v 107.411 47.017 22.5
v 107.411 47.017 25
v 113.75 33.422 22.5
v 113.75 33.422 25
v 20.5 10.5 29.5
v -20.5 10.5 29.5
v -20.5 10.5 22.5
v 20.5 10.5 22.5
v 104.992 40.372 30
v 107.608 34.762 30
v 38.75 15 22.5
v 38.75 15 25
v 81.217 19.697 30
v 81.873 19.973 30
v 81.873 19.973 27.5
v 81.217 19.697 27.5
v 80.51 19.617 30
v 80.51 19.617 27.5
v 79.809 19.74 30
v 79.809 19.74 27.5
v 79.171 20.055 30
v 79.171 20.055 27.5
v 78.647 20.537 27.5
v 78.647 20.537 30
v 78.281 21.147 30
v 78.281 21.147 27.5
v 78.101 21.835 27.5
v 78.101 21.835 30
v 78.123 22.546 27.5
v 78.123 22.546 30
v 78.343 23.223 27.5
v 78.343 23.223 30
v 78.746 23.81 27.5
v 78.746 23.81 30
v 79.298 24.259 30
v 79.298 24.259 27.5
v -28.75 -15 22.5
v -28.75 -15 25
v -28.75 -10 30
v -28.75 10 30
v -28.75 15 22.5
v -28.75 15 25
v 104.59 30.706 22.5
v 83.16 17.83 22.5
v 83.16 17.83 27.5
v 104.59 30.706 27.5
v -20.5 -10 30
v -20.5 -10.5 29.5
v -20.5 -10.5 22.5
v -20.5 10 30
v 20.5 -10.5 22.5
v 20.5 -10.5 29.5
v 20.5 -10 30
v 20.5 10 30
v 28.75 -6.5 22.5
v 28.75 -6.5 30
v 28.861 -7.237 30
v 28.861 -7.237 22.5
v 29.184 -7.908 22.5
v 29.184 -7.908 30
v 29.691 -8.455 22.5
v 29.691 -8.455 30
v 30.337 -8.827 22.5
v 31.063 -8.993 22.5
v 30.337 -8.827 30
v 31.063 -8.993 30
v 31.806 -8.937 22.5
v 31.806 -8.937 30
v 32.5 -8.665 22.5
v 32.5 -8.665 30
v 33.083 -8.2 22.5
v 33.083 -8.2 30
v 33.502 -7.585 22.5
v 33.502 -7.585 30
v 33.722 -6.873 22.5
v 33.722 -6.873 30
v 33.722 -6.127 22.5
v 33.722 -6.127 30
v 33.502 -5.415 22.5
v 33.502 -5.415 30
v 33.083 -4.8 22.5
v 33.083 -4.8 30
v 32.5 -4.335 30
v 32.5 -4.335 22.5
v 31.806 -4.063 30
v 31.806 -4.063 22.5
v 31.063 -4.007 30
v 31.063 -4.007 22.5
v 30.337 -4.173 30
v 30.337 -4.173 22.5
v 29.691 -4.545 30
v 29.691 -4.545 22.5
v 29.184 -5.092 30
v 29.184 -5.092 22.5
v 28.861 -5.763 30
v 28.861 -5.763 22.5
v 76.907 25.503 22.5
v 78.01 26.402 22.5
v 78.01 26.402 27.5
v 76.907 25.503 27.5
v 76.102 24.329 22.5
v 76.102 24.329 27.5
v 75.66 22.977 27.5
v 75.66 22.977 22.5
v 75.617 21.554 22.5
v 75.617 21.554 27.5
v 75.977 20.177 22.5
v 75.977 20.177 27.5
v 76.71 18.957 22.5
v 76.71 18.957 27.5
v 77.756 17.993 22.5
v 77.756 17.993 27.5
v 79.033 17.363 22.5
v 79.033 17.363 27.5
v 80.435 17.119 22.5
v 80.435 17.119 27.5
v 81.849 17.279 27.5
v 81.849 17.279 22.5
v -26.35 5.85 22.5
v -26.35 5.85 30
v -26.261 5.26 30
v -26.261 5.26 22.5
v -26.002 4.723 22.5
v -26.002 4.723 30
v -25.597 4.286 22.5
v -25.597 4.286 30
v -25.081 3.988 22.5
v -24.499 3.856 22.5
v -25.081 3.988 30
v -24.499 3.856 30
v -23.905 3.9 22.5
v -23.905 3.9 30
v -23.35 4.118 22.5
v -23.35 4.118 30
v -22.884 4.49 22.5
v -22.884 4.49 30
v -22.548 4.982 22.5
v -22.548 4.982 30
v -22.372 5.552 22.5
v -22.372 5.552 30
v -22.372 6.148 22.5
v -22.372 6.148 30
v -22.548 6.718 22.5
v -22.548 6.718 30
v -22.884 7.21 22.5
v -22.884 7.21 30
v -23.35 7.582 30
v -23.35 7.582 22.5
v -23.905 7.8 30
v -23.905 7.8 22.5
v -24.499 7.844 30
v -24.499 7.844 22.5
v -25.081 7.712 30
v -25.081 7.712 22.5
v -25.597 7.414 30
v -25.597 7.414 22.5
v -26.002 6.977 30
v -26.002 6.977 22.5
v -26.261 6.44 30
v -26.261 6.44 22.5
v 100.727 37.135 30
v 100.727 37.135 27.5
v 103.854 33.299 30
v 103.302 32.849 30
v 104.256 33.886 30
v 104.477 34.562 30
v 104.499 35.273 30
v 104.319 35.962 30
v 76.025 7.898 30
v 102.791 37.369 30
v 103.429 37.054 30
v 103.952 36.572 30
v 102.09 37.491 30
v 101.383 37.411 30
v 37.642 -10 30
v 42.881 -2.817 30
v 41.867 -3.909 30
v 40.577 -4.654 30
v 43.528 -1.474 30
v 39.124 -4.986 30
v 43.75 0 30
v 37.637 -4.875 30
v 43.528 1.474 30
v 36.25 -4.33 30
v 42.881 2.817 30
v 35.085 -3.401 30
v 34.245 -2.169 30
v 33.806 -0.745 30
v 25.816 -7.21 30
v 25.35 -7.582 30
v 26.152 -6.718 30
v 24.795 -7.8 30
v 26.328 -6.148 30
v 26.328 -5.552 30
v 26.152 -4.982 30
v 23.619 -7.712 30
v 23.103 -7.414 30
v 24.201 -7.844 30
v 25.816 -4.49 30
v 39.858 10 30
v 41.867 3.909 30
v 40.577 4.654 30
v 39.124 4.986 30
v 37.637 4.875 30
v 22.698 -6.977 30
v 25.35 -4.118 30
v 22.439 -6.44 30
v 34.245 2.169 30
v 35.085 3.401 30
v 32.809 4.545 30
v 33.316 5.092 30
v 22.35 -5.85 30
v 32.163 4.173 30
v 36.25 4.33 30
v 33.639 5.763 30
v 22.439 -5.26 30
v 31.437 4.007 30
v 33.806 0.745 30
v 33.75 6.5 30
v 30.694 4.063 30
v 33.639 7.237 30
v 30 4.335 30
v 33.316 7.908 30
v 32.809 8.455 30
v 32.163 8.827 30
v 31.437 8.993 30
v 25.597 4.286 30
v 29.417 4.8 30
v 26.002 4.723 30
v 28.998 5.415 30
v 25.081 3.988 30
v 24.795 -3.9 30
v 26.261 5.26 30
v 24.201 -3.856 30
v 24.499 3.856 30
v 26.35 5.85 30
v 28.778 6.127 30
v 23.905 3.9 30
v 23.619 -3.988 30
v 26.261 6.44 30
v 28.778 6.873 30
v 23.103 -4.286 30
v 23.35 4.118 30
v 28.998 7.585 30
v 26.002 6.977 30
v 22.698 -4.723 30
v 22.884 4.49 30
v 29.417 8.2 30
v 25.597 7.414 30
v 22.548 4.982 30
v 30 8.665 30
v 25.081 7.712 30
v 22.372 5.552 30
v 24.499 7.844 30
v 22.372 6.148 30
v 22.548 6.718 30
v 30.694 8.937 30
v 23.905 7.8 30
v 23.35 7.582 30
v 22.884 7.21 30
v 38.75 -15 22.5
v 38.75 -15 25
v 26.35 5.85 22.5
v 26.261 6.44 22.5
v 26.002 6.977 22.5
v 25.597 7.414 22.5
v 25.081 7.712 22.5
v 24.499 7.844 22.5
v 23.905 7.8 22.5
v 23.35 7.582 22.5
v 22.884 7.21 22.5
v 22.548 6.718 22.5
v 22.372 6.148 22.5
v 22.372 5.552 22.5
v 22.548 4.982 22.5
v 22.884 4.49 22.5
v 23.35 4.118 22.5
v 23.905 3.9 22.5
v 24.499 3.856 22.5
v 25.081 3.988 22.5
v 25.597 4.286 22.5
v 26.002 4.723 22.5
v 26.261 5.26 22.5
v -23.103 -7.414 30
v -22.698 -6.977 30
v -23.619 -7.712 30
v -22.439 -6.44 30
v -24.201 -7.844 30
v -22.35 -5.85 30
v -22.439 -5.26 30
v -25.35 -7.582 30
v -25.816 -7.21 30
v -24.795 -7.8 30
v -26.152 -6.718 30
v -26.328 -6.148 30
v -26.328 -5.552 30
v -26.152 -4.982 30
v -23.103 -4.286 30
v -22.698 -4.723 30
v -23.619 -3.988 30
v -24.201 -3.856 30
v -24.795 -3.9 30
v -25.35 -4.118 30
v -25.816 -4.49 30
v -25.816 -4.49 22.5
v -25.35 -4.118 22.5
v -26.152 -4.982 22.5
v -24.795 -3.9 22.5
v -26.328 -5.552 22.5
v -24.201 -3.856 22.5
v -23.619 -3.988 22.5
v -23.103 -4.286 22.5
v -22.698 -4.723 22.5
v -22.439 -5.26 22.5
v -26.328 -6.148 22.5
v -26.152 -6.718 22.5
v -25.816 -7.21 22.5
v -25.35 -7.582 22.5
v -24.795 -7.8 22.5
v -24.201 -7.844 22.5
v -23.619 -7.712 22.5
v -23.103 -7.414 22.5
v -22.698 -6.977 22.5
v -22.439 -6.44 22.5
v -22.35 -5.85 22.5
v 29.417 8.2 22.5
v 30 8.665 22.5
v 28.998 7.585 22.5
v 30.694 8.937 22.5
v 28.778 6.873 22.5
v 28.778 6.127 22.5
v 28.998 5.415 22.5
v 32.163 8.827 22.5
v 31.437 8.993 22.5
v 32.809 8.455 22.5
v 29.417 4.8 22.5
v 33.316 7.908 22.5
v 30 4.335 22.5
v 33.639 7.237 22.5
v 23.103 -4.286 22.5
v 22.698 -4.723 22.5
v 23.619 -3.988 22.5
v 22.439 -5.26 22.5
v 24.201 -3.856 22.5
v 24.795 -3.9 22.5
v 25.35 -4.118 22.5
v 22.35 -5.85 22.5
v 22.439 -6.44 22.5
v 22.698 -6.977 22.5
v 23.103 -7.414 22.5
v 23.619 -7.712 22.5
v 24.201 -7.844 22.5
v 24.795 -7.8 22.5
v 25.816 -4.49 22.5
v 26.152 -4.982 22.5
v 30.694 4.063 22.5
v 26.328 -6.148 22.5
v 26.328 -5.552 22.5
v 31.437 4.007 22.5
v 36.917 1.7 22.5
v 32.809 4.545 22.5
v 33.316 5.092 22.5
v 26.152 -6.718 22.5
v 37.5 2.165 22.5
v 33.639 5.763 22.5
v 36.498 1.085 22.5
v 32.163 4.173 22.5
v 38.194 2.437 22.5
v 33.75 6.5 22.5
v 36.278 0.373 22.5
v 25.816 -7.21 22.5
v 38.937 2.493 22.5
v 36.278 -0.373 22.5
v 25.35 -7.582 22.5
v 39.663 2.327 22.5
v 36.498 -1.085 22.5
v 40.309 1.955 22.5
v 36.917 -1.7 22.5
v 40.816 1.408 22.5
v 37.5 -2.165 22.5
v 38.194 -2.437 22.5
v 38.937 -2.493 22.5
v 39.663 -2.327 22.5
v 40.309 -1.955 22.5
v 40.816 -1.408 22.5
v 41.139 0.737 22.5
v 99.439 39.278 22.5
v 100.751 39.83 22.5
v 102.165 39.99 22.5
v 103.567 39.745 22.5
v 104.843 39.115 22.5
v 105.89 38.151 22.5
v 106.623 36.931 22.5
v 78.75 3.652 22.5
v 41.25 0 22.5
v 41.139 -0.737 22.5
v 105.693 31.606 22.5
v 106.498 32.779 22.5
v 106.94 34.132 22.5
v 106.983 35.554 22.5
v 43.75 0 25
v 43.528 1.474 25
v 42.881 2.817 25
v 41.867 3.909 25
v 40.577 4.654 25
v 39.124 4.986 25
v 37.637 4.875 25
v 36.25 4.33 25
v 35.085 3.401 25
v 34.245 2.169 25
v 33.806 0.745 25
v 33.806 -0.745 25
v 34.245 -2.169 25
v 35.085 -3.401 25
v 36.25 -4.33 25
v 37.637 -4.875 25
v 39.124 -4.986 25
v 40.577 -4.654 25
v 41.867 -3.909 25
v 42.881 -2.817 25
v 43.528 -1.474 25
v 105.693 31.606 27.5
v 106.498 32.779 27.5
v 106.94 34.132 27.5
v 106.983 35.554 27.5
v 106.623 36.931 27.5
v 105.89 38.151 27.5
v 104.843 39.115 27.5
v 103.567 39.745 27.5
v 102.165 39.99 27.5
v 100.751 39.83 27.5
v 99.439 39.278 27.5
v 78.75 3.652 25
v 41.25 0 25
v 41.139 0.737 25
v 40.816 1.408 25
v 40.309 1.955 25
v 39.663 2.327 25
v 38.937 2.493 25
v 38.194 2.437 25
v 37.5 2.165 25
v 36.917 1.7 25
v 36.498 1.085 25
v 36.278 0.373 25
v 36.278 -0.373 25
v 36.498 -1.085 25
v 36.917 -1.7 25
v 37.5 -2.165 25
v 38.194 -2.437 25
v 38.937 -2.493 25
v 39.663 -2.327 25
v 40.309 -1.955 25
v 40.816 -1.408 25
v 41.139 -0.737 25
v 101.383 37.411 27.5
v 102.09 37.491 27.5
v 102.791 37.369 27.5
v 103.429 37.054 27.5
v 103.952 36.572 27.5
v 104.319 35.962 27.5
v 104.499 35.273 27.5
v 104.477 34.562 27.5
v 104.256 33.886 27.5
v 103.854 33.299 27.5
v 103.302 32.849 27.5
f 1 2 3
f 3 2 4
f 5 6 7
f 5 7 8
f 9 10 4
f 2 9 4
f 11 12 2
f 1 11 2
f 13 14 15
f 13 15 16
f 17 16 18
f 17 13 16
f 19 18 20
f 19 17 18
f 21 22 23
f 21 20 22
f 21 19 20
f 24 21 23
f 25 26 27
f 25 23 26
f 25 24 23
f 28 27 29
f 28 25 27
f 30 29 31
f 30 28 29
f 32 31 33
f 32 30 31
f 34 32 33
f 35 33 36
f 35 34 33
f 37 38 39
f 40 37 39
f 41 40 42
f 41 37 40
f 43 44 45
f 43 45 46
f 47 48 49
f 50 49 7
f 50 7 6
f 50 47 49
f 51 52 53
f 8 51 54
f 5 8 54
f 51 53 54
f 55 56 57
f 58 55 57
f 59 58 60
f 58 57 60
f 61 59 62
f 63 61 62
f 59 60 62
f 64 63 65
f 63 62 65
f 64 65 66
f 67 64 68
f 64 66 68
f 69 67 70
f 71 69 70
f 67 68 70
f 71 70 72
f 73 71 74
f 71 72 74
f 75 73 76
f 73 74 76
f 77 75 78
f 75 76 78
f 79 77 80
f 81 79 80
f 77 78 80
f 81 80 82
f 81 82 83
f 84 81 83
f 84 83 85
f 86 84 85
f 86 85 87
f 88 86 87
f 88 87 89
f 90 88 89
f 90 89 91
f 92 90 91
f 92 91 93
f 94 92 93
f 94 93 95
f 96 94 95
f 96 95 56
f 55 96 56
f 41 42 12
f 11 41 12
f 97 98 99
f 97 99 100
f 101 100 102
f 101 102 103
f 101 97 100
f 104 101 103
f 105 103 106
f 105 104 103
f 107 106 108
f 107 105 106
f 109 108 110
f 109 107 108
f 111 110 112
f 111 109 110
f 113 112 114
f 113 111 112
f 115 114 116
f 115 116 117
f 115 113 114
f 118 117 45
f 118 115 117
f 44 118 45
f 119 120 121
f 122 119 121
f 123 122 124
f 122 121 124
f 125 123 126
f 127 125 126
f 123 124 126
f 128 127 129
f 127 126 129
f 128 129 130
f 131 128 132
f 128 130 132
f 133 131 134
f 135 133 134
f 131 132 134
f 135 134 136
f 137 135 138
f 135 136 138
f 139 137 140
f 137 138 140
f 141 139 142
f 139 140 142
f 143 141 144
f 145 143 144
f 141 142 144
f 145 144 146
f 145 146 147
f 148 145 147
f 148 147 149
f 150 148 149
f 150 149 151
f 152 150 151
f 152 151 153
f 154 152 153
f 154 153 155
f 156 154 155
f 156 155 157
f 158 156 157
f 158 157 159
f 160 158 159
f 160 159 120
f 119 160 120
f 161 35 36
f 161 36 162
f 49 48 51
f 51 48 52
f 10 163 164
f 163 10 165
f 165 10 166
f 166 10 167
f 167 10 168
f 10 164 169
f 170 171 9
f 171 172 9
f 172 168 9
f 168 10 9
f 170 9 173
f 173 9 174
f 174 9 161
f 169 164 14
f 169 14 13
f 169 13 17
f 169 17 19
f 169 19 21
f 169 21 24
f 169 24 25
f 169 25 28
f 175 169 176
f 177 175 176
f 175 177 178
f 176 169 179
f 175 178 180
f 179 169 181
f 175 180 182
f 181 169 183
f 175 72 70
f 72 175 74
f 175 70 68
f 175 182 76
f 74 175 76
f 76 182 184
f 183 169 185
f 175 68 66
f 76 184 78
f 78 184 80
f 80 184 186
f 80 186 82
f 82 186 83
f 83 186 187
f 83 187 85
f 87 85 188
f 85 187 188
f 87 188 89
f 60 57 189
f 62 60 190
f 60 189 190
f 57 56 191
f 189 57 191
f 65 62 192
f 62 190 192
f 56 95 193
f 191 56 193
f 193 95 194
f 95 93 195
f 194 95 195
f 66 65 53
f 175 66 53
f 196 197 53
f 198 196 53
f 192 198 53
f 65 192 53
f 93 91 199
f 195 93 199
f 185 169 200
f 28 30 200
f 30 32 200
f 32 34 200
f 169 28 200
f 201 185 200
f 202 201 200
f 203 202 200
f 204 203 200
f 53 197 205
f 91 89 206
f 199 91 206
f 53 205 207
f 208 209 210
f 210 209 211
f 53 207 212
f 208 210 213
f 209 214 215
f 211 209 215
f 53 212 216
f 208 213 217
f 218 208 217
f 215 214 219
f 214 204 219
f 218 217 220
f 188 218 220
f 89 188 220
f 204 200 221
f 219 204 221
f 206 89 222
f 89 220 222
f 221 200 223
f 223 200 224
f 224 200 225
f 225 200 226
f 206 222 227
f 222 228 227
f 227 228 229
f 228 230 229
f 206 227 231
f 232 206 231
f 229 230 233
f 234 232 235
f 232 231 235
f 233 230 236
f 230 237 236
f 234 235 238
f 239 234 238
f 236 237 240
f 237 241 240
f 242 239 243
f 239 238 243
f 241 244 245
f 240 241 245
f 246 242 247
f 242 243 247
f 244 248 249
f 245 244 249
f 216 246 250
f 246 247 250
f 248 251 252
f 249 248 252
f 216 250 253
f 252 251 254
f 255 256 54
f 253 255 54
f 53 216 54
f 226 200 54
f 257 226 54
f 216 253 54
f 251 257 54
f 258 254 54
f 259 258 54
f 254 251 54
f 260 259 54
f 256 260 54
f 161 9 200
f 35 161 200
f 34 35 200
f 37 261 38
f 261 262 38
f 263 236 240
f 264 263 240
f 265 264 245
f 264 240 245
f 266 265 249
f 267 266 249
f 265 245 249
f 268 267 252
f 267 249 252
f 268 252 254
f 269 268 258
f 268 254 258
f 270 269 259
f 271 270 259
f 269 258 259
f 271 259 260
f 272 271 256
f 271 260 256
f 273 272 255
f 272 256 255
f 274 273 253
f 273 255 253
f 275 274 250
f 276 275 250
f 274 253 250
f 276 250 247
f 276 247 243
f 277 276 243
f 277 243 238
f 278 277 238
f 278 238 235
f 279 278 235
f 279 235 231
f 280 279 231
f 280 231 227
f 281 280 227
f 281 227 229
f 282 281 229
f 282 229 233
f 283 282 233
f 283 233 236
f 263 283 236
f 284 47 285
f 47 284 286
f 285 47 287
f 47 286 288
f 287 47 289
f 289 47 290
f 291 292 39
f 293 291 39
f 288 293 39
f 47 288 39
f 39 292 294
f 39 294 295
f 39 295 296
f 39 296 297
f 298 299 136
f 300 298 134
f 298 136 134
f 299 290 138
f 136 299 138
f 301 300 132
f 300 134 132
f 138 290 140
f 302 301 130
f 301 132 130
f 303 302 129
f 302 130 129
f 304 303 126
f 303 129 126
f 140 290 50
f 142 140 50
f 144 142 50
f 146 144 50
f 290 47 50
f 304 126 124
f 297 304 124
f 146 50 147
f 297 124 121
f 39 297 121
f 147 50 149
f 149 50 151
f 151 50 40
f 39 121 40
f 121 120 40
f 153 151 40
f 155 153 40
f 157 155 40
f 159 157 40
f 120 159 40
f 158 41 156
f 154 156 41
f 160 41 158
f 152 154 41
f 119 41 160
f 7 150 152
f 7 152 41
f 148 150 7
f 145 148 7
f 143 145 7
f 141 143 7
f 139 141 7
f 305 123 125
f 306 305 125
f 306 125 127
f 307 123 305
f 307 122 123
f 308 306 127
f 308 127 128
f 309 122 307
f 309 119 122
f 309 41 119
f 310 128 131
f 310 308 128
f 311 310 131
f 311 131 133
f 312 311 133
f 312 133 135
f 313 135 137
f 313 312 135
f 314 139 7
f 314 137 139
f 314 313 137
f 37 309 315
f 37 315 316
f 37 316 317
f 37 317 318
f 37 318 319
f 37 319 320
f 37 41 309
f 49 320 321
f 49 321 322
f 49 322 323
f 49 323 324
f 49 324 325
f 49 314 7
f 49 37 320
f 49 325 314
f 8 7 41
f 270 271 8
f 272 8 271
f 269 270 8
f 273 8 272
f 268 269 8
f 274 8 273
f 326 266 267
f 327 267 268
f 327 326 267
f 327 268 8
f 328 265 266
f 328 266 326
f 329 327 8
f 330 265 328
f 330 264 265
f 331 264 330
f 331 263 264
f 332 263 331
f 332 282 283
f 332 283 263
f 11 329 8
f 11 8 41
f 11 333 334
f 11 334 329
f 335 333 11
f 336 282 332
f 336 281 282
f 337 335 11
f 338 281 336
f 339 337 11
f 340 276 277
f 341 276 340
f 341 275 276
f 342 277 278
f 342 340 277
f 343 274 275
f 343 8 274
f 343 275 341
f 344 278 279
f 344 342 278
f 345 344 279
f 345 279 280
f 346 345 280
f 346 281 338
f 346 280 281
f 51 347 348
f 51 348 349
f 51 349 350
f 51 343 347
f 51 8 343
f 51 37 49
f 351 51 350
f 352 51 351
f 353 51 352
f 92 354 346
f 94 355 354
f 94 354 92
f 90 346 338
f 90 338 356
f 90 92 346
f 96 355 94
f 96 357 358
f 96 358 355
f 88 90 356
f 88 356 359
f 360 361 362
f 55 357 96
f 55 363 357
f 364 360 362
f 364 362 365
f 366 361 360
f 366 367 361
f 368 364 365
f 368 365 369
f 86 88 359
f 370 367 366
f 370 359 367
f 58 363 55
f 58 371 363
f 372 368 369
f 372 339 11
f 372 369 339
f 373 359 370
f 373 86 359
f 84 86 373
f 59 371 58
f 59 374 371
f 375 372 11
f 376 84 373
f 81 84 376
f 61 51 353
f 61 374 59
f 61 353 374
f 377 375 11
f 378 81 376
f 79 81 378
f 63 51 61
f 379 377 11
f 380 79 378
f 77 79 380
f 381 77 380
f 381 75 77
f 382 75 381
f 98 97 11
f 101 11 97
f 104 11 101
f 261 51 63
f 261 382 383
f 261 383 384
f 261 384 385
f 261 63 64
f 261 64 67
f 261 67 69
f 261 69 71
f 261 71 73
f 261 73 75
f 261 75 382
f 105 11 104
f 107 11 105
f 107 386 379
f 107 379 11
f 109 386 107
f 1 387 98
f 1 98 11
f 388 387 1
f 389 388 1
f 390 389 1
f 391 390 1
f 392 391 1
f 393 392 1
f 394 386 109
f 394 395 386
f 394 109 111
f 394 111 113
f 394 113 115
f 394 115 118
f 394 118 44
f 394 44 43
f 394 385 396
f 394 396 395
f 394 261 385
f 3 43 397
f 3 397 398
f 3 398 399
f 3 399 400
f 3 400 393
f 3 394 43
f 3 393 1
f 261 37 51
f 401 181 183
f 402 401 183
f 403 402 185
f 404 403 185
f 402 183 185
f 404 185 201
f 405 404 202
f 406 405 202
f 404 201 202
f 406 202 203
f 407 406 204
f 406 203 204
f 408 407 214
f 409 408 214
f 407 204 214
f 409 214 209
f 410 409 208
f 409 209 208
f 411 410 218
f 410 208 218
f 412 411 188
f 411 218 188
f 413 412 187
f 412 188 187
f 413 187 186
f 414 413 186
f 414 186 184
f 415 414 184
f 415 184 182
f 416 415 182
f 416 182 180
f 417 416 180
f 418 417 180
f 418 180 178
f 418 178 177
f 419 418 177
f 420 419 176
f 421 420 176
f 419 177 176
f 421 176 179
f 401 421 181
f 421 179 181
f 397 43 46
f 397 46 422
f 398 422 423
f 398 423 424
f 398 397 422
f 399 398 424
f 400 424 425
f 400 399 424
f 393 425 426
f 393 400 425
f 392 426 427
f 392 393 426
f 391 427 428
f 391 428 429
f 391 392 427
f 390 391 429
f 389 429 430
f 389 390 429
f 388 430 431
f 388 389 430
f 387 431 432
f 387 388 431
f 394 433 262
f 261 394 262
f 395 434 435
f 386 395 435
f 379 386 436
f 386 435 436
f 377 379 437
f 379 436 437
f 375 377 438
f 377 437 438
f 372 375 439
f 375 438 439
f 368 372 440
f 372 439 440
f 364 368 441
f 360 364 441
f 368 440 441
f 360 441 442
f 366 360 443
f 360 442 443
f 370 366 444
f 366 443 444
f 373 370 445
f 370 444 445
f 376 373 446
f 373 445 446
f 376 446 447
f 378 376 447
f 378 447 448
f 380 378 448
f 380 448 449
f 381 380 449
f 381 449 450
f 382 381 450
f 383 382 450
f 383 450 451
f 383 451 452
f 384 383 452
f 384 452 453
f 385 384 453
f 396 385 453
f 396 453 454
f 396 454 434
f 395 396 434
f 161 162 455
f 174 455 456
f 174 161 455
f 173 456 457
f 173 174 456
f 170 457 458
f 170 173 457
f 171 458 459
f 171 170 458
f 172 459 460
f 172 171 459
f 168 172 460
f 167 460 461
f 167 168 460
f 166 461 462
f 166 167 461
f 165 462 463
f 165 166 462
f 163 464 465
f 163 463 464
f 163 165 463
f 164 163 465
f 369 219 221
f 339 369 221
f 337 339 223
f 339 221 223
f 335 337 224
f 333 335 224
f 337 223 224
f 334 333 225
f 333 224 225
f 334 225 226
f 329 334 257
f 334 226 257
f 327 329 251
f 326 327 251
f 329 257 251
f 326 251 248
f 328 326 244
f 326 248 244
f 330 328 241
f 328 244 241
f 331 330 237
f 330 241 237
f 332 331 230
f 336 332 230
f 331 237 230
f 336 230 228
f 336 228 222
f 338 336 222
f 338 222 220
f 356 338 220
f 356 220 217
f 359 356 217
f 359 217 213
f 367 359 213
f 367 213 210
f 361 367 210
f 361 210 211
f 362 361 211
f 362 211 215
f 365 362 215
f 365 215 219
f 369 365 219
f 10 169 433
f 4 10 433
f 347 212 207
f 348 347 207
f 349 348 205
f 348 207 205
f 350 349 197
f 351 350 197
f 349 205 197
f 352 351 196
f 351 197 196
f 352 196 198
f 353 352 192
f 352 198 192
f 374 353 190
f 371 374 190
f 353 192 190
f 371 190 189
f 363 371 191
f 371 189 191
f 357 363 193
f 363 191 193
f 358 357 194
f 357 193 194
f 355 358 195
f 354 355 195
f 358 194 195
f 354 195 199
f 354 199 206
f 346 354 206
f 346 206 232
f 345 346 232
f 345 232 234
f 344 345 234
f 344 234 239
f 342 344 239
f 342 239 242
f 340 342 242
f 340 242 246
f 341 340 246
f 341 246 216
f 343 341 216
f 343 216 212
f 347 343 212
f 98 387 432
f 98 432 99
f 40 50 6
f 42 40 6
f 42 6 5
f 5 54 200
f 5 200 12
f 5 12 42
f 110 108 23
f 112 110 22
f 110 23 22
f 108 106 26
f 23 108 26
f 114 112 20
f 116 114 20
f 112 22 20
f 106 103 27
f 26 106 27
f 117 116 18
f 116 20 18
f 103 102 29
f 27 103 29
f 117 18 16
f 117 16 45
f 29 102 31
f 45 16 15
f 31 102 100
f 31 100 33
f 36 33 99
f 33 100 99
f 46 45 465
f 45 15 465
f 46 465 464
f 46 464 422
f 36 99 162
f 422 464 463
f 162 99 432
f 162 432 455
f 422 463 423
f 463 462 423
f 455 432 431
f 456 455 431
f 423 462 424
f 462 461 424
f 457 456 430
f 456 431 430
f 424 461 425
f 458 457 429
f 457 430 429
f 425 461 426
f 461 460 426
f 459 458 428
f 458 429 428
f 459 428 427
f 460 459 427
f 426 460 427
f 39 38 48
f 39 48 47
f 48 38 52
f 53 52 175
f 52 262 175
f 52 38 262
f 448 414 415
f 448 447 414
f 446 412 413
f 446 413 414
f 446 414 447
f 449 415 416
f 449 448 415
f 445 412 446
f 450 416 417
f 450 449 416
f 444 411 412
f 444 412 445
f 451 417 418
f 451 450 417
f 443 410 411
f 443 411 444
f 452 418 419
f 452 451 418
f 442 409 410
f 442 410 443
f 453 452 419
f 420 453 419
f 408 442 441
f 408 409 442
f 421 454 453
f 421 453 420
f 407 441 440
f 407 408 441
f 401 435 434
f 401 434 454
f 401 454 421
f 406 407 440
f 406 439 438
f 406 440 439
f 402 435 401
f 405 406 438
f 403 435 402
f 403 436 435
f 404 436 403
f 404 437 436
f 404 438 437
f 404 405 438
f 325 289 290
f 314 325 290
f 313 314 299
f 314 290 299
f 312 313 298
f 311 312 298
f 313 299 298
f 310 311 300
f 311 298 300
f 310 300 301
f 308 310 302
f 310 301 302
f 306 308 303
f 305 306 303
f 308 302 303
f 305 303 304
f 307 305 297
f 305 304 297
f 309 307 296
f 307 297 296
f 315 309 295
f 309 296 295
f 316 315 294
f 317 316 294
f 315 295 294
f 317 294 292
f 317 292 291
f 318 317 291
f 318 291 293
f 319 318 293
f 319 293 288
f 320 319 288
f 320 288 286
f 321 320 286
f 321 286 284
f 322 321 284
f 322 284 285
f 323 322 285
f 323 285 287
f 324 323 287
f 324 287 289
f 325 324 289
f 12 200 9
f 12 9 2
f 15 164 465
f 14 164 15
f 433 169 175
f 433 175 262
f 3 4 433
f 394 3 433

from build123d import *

# Parameters (mm, degrees)
SKETCH1_W                = 57.5
SKETCH1_H                = 30
BOSS_EXTRUDE1_DEPTH      = 30
SKETCH2_W                = 41
SKETCH2_H                = 21
CUT_EXTRUDE1_DEPTH       = 25
SKETCH8_R                = 2
CUT_EXTRUDE6_DEPTH       = 10
SKETCH10_R               = 5
CUT_EXTRUDE8_DEPTH       = 10
BOSS_EXTRUDE4_DEPTH      = 30
SKETCH16_R               = 5
CUT_EXTRUDE10_DEPTH      = 30
CHAMFER5_SIZE            = 5
SKETCH19_R               = 2.5
CUT_EXTRUDE12_DEPTH      = 30
SKETCH20_R               = 7.5
CUT_EXTRUDE13_DEPTH      = 2.5
CUT_EXTRUDE15_DEPTH      = 122.918629513
CUT_EXTRUDE15_DEPTH_BACK = 122.918629513
SKETCH29_W               = 67.5
SKETCH29_H               = 17.5
CUT_EXTRUDE16_DEPTH      = 124.312257678
SKETCH32_R               = 5
CUT_EXTRUDE18_DEPTH      = 5
CUT_EXTRUDE19_DEPTH      = 5


with BuildPart() as part:
    # Sketch1 → Boss-Extrude1 (new body)
    with BuildSketch(Plane.XY):
        Rectangle(SKETCH1_W, SKETCH1_H)
    extrude(amount=BOSS_EXTRUDE1_DEPTH)

    # Sketch2 → Cut-Extrude1 (cut)
    with BuildSketch(Plane.XY.offset(30)):
        Rectangle(SKETCH2_W, SKETCH2_H)
    extrude(amount=-CUT_EXTRUDE1_DEPTH, mode=Mode.SUBTRACT)

    # Sketch8 → Cut-Extrude6 (cut)
    with BuildSketch(Plane.XY.offset(30)):
        with Locations((24.35, 5.85)):
            Circle(SKETCH8_R)
        with Locations(Location((24.35, -5.85, 0), (0, 0, 180))):
            Circle(SKETCH8_R)
        with Locations((-24.35, -5.85)):
            Circle(SKETCH8_R)
        with Locations(Location((-24.35, 5.85, 0), (0, 0, 180))):
            Circle(SKETCH8_R)
    extrude(amount=-CUT_EXTRUDE6_DEPTH, mode=Mode.SUBTRACT)

    # Sketch10 → Cut-Extrude8 (cut)
    with BuildSketch(Plane.XY.offset(5)):
        with Locations((-10, 0)):
            Circle(SKETCH10_R)
    extrude(amount=-CUT_EXTRUDE8_DEPTH, mode=Mode.SUBTRACT)

    # Sketch13 → Boss-Extrude4 (add)
    with BuildSketch(Plane.XY.offset(30)):
        Polygon((28.75, 15), (38.75, 15), (107.410726074, 47.017022383), (113.75, 33.422405577), (78.75, 3.652306326), (38.75, -15), (28.75, -15), align=None)
    extrude(amount=-BOSS_EXTRUDE4_DEPTH)

    # Sketch16 → Cut-Extrude10 (cut)
    with BuildSketch(Plane(origin=(1.175656739, -2.521204013, 0), x_dir=(0.9063077870366488, 0.42261826174070183, 0), z_dir=(-0.42261826174070183, 0.9063077870366488, 0))):
        with Locations(Location((97.217429724, -15, 0), (0, 0, 180))):
            Circle(SKETCH16_R)
        with BuildLine():
            Line((67.217429724, -12.5), (82.217429724, -12.5))
            ThreePointArc((82.217429724, -12.5), (84.717429724, -15), (82.217429724, -17.5))
            Line((82.217429724, -17.5), (67.217429724, -17.5))
            ThreePointArc((67.217429724, -17.5), (64.717429724, -15), (67.217429724, -12.5))
        make_face()
    extrude(amount=-CUT_EXTRUDE10_DEPTH, mode=Mode.SUBTRACT)

    # Chamfer5
    # the kernel refuses this chamfer: 5 mm, written as the material it takes off along each edge
    with BuildSketch(Plane(origin=(-28.75, 27.85841494, 0), x_dir=(-0.027495876610586317, 0, 0.9996219169112968), z_dir=(0, -1, 0))) as chamfer5_piece_1:
        Polygon((CHAMFER5_SIZE * 0.999621916911, -CHAMFER5_SIZE * 0.0274958766106), (-CHAMFER5_SIZE * 0.0274958766106, -CHAMFER5_SIZE * 0.999621916911), (0, 0), align=None)
    extrude(amount=55.71682988, mode=Mode.SUBTRACT)
    with BuildSketch(Plane(origin=(-41.60841494, -15, 0), x_dir=(0, -0.027495876610586317, 0.9996219169112968), z_dir=(1, 0, 0)), Plane(origin=(51.60841494, -15, 30), x_dir=(0, -0.027495876610586317, -0.9996219169112968), z_dir=(-1, 0, 0))) as chamfer5_piece_2:
        Polygon((CHAMFER5_SIZE * 0.999621916911, -CHAMFER5_SIZE * 0.0274958766106), (-CHAMFER5_SIZE * 0.0274958766106, -CHAMFER5_SIZE * 0.999621916911), (0, 0), align=None)
    extrude(amount=93.21682988, mode=Mode.SUBTRACT)
    with BuildSketch(Plane(origin=(90.403681589, 9.086507297, 0), x_dir=(0.011620259578202724, -0.024919727083573626, 0.9996219169112968), z_dir=(-0.9063077870366526, -0.4226182617406939, 0)), Plane(origin=(90.403681589, 9.086507297, 30), x_dir=(-0.4224584769229526, 0.905965127389214, 0.02749587661058631), z_dir=(-0.9063077870366526, -0.4226182617406939, 0))) as chamfer5_piece_3:
        Polygon((CHAMFER5_SIZE * 0.999621916911, CHAMFER5_SIZE * 0.0274958766106), (-CHAMFER5_SIZE * 0.0274958766106, CHAMFER5_SIZE * 0.999621916911), (0, 0), align=None)
    extrude(amount=69.851946638, mode=Mode.SUBTRACT)
    with BuildSketch(Plane(origin=(123.544555766, 41.753402643, 0), x_dir=(-0.6476573741944397, 0.7614354223576539, -0.027495876610586414), z_dir=(-0.7617234170999287, -0.6479023351104763, 0))) as chamfer5_piece_4:
        Polygon((CHAMFER5_SIZE * 0.999621916911, -CHAMFER5_SIZE * 0.0274958766106), (-CHAMFER5_SIZE * 0.0274958766106, -CHAMFER5_SIZE * 0.999621916911), (0, 0), align=None)
    extrude(amount=71.665266299, mode=Mode.SUBTRACT)
    with BuildSketch(Plane(origin=(101.976525103, 58.670703972, 0), x_dir=(-0.9059651273892108, -0.42245847692295924, -0.027495876610586344), z_dir=(0.42261826174070055, -0.9063077870366495, 0))) as chamfer5_piece_5:
        Polygon((CHAMFER5_SIZE * 0.999621916911, -CHAMFER5_SIZE * 0.0274958766106), (-CHAMFER5_SIZE * 0.0274958766106, -CHAMFER5_SIZE * 0.999621916911), (0, 0), align=None)
    extrude(amount=40.71682988, mode=Mode.SUBTRACT)
    with BuildSketch(Plane(origin=(27.096318411, 9.565799029, 0), x_dir=(0.4224584769229604, -0.9059651273892103, -0.02749587661058636), z_dir=(0.9063077870366489, 0.4226182617407018, 0))) as chamfer5_piece_6_section:
        Polygon((CHAMFER5_SIZE * 0.999621916911, -CHAMFER5_SIZE * 0.0274958766106), (-CHAMFER5_SIZE * 0.0274958766106, -CHAMFER5_SIZE * 0.999621916911), (0, 0), align=None)
    chamfer5_piece_6 = extrude(amount=101.47555893, mode=Mode.PRIVATE)
    chamfer5_piece_6 = split(chamfer5_piece_6, bisect_by=Plane(origin=(81.150743587, 15, 1.670360501), z_dir=(0, 1, 0)), keep=Keep.TOP, mode=Mode.PRIVATE)
    add(chamfer5_piece_6, mode=Mode.SUBTRACT)
    with BuildSketch(Plane(origin=(-41.60841494, 15, 0), x_dir=(0, -0.9996219169112968, -0.027495876610586372), z_dir=(1, 0, 0))) as chamfer5_piece_7_section:
        Polygon((CHAMFER5_SIZE * 0.999621916911, -CHAMFER5_SIZE * 0.0274958766106), (-CHAMFER5_SIZE * 0.0274958766106, -CHAMFER5_SIZE * 0.999621916911), (0, 0), align=None)
    chamfer5_piece_7 = extrude(amount=93.21682988, mode=Mode.PRIVATE)
    chamfer5_piece_7 = split(chamfer5_piece_7, bisect_by=Plane(origin=(3.719146846, -1.335155097, 1.672660276), z_dir=(-0.4226182617407018, 0.9063077870366489, 0)), keep=Keep.TOP, mode=Mode.PRIVATE)
    add(chamfer5_piece_7, mode=Mode.SUBTRACT)
    with BuildSketch(Plane(origin=(51.60841494, 15, 30), x_dir=(0, -0.9996219169112968, 0.027495876610586317), z_dir=(-1, 0, 0))) as chamfer5_piece_8_section:
        Polygon((CHAMFER5_SIZE * 0.999621916911, -CHAMFER5_SIZE * 0.0274958766106), (-CHAMFER5_SIZE * 0.0274958766106, -CHAMFER5_SIZE * 0.999621916911), (0, 0), align=None)
    chamfer5_piece_8 = extrude(amount=93.21682988, mode=Mode.PRIVATE)
    chamfer5_piece_8 = split(chamfer5_piece_8, bisect_by=Plane(origin=(3.719146846, -1.335155097, 28.327339724), z_dir=(-0.4226182617407018, 0.9063077870366489, 0)), keep=Keep.TOP, mode=Mode.PRIVATE)
    add(chamfer5_piece_8, mode=Mode.SUBTRACT)
    with BuildSketch(Plane(origin=(123.544555766, 41.753402643, 30), x_dir=(-0.6476573741944397, 0.7614354223576539, 0.02749587661058634), z_dir=(-0.7617234170999287, -0.6479023351104763, 0))) as chamfer5_piece_9:
        Polygon((CHAMFER5_SIZE * 0.999621916911, CHAMFER5_SIZE * 0.0274958766106), (-CHAMFER5_SIZE * 0.0274958766106, CHAMFER5_SIZE * 0.999621916911), (0, 0), align=None)
    extrude(amount=71.665266299, mode=Mode.SUBTRACT)
    with BuildSketch(Plane(origin=(27.096318411, 9.565799029, 30), x_dir=(0.4224584769229604, -0.9059651273892103, 0.027495876610586313), z_dir=(0.9063077870366489, 0.4226182617407018, 0))) as chamfer5_piece_10_section:
        Polygon((CHAMFER5_SIZE * 0.999621916911, CHAMFER5_SIZE * 0.0274958766106), (-CHAMFER5_SIZE * 0.0274958766106, CHAMFER5_SIZE * 0.999621916911), (0, 0), align=None)
    chamfer5_piece_10 = extrude(amount=101.47555893, mode=Mode.PRIVATE)
    chamfer5_piece_10 = split(chamfer5_piece_10, bisect_by=Plane(origin=(81.150743587, 15, 28.329639499), z_dir=(0, 1, 0)), keep=Keep.TOP, mode=Mode.PRIVATE)
    add(chamfer5_piece_10, mode=Mode.SUBTRACT)
    with BuildSketch(Plane(origin=(101.976525103, 58.670703972, 30), x_dir=(-0.9059651273892108, -0.42245847692295924, 0.027495876610586337), z_dir=(0.42261826174070055, -0.9063077870366495, 0))) as chamfer5_piece_11:
        Polygon((CHAMFER5_SIZE * 0.999621916911, CHAMFER5_SIZE * 0.0274958766106), (-CHAMFER5_SIZE * 0.0274958766106, CHAMFER5_SIZE * 0.999621916911), (0, 0), align=None)
    extrude(amount=40.71682988, mode=Mode.SUBTRACT)
    with BuildSketch(Plane(origin=(27.096318411, 9.565799029, 0), x_dir=(0.4224584769229604, -0.9059651273892103, -0.02749587661058636), z_dir=(0.9063077870366489, 0.4226182617407018, 0))) as chamfer5_piece_12a_section:
        Polygon((CHAMFER5_SIZE * 0.999621916911, -CHAMFER5_SIZE * 0.0274958766106), (-CHAMFER5_SIZE * 0.0274958766106, -CHAMFER5_SIZE * 0.999621916911), (0, 0), align=None)
    chamfer5_piece_12a = extrude(amount=101.47555893, mode=Mode.PRIVATE)
    chamfer5_piece_12a = split(chamfer5_piece_12a, bisect_by=Plane(origin=(35.512062488, 15, 1.537951212), z_dir=(0, -1, 0)), keep=Keep.TOP, mode=Mode.PRIVATE)
    with BuildSketch(Plane(origin=(-41.60841494, 15, 0), x_dir=(0, -0.9996219169112968, -0.027495876610586372), z_dir=(1, 0, 0))) as chamfer5_piece_12b_section:
        Polygon((CHAMFER5_SIZE * 0.999621916911, -CHAMFER5_SIZE * 0.0274958766106), (-CHAMFER5_SIZE * 0.0274958766106, -CHAMFER5_SIZE * 0.999621916911), (0, 0), align=None)
    chamfer5_piece_12b = extrude(amount=93.21682988, mode=Mode.PRIVATE)
    chamfer5_piece_12b = split(chamfer5_piece_12b, bisect_by=Plane(origin=(41.684567981, 16.368411523, 1.537951212), z_dir=(0.4226182617407018, -0.9063077870366489, 0)), keep=Keep.TOP, mode=Mode.PRIVATE)
    chamfer5_piece_12 = chamfer5_piece_12a & chamfer5_piece_12b
    add(chamfer5_piece_12, mode=Mode.SUBTRACT)
    with BuildSketch(Plane(origin=(27.096318411, 9.565799029, 30), x_dir=(0.4224584769229604, -0.9059651273892103, 0.027495876610586313), z_dir=(0.9063077870366489, 0.4226182617407018, 0))) as chamfer5_piece_13a_section:
        Polygon((CHAMFER5_SIZE * 0.999621916911, CHAMFER5_SIZE * 0.0274958766106), (-CHAMFER5_SIZE * 0.0274958766106, CHAMFER5_SIZE * 0.999621916911), (0, 0), align=None)
    chamfer5_piece_13a = extrude(amount=101.47555893, mode=Mode.PRIVATE)
    chamfer5_piece_13a = split(chamfer5_piece_13a, bisect_by=Plane(origin=(35.512062488, 15, 28.462048788), z_dir=(0, -1, 0)), keep=Keep.TOP, mode=Mode.PRIVATE)
    with BuildSketch(Plane(origin=(51.60841494, 15, 30), x_dir=(0, -0.9996219169112968, 0.027495876610586317), z_dir=(-1, 0, 0))) as chamfer5_piece_13b_section:
        Polygon((CHAMFER5_SIZE * 0.999621916911, -CHAMFER5_SIZE * 0.0274958766106), (-CHAMFER5_SIZE * 0.0274958766106, -CHAMFER5_SIZE * 0.999621916911), (0, 0), align=None)
    chamfer5_piece_13b = extrude(amount=93.21682988, mode=Mode.PRIVATE)
    chamfer5_piece_13b = split(chamfer5_piece_13b, bisect_by=Plane(origin=(41.684567981, 16.368411523, 28.462048788), z_dir=(0.4226182617407018, -0.9063077870366489, 0)), keep=Keep.TOP, mode=Mode.PRIVATE)
    chamfer5_piece_13 = chamfer5_piece_13a & chamfer5_piece_13b
    add(chamfer5_piece_13, mode=Mode.SUBTRACT)

    # Sketch19 → Cut-Extrude12 (cut)
    with BuildSketch(Plane.XY.offset(30)):
        with Locations((38.75, 0)):
            Circle(SKETCH19_R)
        with Locations((31.25, 6.5)):
            Circle(SKETCH19_R)
        with Locations(Location((31.25, -6.5, 0), (0, 0, 180))):
            Circle(SKETCH19_R)
    extrude(amount=-CUT_EXTRUDE12_DEPTH, mode=Mode.SUBTRACT)

    # Sketch20 → Cut-Extrude13 (cut)
    with BuildSketch(Plane.XY.offset(5)):
        with Locations((-10, 0)):
            Circle(SKETCH20_R)
    extrude(amount=-CUT_EXTRUDE13_DEPTH, mode=Mode.SUBTRACT)

    # Sketch29 → Cut-Extrude15 (cut, two sides: drawn at the far end of the back side and taken through both)
    with BuildSketch(Plane(origin=(0, 15, 0), x_dir=(1, 0, 0), z_dir=(0, 1, 0)).offset(-CUT_EXTRUDE15_DEPTH_BACK)):
        with Locations((5, -13.75)):
            Rectangle(SKETCH29_W, SKETCH29_H)
        Polygon((38.75, -22.5), (113.75, -22.5), (113.75, 0), (-28.75, 0), (-28.75, -5), (38.75, -5), align=None)
    extrude(amount=CUT_EXTRUDE15_DEPTH + CUT_EXTRUDE15_DEPTH_BACK, mode=Mode.SUBTRACT)

    # Sketch30 → Cut-Extrude16 (cut, through all)
    with BuildSketch(Plane.XY.offset(30)):
        with BuildLine():
            Line((79.297644941, 24.259194476), (100.726827459, 37.135146348))
            ThreePointArc((100.726827459, 37.135146348), (104.157340898, 36.279823284), (103.302017833, 32.849309845))
            Line((103.302017833, 32.849309845), (81.872835316, 19.973357972))
            ThreePointArc((81.872835316, 19.973357972), (78.442321877, 20.828681036), (79.297644941, 24.259194476))
        make_face()
    extrude(amount=-CUT_EXTRUDE16_DEPTH, mode=Mode.SUBTRACT)

    # Sketch32 → Cut-Extrude18 (cut)
    with BuildSketch(Plane.XY.offset(30)):
        with Locations((38.75, 0)):
            Circle(SKETCH32_R)
    extrude(amount=-CUT_EXTRUDE18_DEPTH, mode=Mode.SUBTRACT)

    # Sketch36 → Cut-Extrude19 (cut)
    with BuildSketch(Plane(origin=(0, 0, 22.5), x_dir=(-1, 0, 0), z_dir=(0, 0, -1))):
        with BuildLine():
            Line((-99.439232272, 39.2780646), (-78.010049754, 26.402112727))
            ThreePointArc((-78.010049754, 26.402112727), (-76.299403625, 19.541085849), (-83.160430503, 17.83043972))
            Line((-83.160430503, 17.83043972), (-104.589613021, 30.706391593))
            ThreePointArc((-104.589613021, 30.706391593), (-106.30025915, 37.567418471), (-99.439232272, 39.2780646))
        make_face()
    extrude(amount=-CUT_EXTRUDE19_DEPTH, mode=Mode.SUBTRACT)


solid = part.part
